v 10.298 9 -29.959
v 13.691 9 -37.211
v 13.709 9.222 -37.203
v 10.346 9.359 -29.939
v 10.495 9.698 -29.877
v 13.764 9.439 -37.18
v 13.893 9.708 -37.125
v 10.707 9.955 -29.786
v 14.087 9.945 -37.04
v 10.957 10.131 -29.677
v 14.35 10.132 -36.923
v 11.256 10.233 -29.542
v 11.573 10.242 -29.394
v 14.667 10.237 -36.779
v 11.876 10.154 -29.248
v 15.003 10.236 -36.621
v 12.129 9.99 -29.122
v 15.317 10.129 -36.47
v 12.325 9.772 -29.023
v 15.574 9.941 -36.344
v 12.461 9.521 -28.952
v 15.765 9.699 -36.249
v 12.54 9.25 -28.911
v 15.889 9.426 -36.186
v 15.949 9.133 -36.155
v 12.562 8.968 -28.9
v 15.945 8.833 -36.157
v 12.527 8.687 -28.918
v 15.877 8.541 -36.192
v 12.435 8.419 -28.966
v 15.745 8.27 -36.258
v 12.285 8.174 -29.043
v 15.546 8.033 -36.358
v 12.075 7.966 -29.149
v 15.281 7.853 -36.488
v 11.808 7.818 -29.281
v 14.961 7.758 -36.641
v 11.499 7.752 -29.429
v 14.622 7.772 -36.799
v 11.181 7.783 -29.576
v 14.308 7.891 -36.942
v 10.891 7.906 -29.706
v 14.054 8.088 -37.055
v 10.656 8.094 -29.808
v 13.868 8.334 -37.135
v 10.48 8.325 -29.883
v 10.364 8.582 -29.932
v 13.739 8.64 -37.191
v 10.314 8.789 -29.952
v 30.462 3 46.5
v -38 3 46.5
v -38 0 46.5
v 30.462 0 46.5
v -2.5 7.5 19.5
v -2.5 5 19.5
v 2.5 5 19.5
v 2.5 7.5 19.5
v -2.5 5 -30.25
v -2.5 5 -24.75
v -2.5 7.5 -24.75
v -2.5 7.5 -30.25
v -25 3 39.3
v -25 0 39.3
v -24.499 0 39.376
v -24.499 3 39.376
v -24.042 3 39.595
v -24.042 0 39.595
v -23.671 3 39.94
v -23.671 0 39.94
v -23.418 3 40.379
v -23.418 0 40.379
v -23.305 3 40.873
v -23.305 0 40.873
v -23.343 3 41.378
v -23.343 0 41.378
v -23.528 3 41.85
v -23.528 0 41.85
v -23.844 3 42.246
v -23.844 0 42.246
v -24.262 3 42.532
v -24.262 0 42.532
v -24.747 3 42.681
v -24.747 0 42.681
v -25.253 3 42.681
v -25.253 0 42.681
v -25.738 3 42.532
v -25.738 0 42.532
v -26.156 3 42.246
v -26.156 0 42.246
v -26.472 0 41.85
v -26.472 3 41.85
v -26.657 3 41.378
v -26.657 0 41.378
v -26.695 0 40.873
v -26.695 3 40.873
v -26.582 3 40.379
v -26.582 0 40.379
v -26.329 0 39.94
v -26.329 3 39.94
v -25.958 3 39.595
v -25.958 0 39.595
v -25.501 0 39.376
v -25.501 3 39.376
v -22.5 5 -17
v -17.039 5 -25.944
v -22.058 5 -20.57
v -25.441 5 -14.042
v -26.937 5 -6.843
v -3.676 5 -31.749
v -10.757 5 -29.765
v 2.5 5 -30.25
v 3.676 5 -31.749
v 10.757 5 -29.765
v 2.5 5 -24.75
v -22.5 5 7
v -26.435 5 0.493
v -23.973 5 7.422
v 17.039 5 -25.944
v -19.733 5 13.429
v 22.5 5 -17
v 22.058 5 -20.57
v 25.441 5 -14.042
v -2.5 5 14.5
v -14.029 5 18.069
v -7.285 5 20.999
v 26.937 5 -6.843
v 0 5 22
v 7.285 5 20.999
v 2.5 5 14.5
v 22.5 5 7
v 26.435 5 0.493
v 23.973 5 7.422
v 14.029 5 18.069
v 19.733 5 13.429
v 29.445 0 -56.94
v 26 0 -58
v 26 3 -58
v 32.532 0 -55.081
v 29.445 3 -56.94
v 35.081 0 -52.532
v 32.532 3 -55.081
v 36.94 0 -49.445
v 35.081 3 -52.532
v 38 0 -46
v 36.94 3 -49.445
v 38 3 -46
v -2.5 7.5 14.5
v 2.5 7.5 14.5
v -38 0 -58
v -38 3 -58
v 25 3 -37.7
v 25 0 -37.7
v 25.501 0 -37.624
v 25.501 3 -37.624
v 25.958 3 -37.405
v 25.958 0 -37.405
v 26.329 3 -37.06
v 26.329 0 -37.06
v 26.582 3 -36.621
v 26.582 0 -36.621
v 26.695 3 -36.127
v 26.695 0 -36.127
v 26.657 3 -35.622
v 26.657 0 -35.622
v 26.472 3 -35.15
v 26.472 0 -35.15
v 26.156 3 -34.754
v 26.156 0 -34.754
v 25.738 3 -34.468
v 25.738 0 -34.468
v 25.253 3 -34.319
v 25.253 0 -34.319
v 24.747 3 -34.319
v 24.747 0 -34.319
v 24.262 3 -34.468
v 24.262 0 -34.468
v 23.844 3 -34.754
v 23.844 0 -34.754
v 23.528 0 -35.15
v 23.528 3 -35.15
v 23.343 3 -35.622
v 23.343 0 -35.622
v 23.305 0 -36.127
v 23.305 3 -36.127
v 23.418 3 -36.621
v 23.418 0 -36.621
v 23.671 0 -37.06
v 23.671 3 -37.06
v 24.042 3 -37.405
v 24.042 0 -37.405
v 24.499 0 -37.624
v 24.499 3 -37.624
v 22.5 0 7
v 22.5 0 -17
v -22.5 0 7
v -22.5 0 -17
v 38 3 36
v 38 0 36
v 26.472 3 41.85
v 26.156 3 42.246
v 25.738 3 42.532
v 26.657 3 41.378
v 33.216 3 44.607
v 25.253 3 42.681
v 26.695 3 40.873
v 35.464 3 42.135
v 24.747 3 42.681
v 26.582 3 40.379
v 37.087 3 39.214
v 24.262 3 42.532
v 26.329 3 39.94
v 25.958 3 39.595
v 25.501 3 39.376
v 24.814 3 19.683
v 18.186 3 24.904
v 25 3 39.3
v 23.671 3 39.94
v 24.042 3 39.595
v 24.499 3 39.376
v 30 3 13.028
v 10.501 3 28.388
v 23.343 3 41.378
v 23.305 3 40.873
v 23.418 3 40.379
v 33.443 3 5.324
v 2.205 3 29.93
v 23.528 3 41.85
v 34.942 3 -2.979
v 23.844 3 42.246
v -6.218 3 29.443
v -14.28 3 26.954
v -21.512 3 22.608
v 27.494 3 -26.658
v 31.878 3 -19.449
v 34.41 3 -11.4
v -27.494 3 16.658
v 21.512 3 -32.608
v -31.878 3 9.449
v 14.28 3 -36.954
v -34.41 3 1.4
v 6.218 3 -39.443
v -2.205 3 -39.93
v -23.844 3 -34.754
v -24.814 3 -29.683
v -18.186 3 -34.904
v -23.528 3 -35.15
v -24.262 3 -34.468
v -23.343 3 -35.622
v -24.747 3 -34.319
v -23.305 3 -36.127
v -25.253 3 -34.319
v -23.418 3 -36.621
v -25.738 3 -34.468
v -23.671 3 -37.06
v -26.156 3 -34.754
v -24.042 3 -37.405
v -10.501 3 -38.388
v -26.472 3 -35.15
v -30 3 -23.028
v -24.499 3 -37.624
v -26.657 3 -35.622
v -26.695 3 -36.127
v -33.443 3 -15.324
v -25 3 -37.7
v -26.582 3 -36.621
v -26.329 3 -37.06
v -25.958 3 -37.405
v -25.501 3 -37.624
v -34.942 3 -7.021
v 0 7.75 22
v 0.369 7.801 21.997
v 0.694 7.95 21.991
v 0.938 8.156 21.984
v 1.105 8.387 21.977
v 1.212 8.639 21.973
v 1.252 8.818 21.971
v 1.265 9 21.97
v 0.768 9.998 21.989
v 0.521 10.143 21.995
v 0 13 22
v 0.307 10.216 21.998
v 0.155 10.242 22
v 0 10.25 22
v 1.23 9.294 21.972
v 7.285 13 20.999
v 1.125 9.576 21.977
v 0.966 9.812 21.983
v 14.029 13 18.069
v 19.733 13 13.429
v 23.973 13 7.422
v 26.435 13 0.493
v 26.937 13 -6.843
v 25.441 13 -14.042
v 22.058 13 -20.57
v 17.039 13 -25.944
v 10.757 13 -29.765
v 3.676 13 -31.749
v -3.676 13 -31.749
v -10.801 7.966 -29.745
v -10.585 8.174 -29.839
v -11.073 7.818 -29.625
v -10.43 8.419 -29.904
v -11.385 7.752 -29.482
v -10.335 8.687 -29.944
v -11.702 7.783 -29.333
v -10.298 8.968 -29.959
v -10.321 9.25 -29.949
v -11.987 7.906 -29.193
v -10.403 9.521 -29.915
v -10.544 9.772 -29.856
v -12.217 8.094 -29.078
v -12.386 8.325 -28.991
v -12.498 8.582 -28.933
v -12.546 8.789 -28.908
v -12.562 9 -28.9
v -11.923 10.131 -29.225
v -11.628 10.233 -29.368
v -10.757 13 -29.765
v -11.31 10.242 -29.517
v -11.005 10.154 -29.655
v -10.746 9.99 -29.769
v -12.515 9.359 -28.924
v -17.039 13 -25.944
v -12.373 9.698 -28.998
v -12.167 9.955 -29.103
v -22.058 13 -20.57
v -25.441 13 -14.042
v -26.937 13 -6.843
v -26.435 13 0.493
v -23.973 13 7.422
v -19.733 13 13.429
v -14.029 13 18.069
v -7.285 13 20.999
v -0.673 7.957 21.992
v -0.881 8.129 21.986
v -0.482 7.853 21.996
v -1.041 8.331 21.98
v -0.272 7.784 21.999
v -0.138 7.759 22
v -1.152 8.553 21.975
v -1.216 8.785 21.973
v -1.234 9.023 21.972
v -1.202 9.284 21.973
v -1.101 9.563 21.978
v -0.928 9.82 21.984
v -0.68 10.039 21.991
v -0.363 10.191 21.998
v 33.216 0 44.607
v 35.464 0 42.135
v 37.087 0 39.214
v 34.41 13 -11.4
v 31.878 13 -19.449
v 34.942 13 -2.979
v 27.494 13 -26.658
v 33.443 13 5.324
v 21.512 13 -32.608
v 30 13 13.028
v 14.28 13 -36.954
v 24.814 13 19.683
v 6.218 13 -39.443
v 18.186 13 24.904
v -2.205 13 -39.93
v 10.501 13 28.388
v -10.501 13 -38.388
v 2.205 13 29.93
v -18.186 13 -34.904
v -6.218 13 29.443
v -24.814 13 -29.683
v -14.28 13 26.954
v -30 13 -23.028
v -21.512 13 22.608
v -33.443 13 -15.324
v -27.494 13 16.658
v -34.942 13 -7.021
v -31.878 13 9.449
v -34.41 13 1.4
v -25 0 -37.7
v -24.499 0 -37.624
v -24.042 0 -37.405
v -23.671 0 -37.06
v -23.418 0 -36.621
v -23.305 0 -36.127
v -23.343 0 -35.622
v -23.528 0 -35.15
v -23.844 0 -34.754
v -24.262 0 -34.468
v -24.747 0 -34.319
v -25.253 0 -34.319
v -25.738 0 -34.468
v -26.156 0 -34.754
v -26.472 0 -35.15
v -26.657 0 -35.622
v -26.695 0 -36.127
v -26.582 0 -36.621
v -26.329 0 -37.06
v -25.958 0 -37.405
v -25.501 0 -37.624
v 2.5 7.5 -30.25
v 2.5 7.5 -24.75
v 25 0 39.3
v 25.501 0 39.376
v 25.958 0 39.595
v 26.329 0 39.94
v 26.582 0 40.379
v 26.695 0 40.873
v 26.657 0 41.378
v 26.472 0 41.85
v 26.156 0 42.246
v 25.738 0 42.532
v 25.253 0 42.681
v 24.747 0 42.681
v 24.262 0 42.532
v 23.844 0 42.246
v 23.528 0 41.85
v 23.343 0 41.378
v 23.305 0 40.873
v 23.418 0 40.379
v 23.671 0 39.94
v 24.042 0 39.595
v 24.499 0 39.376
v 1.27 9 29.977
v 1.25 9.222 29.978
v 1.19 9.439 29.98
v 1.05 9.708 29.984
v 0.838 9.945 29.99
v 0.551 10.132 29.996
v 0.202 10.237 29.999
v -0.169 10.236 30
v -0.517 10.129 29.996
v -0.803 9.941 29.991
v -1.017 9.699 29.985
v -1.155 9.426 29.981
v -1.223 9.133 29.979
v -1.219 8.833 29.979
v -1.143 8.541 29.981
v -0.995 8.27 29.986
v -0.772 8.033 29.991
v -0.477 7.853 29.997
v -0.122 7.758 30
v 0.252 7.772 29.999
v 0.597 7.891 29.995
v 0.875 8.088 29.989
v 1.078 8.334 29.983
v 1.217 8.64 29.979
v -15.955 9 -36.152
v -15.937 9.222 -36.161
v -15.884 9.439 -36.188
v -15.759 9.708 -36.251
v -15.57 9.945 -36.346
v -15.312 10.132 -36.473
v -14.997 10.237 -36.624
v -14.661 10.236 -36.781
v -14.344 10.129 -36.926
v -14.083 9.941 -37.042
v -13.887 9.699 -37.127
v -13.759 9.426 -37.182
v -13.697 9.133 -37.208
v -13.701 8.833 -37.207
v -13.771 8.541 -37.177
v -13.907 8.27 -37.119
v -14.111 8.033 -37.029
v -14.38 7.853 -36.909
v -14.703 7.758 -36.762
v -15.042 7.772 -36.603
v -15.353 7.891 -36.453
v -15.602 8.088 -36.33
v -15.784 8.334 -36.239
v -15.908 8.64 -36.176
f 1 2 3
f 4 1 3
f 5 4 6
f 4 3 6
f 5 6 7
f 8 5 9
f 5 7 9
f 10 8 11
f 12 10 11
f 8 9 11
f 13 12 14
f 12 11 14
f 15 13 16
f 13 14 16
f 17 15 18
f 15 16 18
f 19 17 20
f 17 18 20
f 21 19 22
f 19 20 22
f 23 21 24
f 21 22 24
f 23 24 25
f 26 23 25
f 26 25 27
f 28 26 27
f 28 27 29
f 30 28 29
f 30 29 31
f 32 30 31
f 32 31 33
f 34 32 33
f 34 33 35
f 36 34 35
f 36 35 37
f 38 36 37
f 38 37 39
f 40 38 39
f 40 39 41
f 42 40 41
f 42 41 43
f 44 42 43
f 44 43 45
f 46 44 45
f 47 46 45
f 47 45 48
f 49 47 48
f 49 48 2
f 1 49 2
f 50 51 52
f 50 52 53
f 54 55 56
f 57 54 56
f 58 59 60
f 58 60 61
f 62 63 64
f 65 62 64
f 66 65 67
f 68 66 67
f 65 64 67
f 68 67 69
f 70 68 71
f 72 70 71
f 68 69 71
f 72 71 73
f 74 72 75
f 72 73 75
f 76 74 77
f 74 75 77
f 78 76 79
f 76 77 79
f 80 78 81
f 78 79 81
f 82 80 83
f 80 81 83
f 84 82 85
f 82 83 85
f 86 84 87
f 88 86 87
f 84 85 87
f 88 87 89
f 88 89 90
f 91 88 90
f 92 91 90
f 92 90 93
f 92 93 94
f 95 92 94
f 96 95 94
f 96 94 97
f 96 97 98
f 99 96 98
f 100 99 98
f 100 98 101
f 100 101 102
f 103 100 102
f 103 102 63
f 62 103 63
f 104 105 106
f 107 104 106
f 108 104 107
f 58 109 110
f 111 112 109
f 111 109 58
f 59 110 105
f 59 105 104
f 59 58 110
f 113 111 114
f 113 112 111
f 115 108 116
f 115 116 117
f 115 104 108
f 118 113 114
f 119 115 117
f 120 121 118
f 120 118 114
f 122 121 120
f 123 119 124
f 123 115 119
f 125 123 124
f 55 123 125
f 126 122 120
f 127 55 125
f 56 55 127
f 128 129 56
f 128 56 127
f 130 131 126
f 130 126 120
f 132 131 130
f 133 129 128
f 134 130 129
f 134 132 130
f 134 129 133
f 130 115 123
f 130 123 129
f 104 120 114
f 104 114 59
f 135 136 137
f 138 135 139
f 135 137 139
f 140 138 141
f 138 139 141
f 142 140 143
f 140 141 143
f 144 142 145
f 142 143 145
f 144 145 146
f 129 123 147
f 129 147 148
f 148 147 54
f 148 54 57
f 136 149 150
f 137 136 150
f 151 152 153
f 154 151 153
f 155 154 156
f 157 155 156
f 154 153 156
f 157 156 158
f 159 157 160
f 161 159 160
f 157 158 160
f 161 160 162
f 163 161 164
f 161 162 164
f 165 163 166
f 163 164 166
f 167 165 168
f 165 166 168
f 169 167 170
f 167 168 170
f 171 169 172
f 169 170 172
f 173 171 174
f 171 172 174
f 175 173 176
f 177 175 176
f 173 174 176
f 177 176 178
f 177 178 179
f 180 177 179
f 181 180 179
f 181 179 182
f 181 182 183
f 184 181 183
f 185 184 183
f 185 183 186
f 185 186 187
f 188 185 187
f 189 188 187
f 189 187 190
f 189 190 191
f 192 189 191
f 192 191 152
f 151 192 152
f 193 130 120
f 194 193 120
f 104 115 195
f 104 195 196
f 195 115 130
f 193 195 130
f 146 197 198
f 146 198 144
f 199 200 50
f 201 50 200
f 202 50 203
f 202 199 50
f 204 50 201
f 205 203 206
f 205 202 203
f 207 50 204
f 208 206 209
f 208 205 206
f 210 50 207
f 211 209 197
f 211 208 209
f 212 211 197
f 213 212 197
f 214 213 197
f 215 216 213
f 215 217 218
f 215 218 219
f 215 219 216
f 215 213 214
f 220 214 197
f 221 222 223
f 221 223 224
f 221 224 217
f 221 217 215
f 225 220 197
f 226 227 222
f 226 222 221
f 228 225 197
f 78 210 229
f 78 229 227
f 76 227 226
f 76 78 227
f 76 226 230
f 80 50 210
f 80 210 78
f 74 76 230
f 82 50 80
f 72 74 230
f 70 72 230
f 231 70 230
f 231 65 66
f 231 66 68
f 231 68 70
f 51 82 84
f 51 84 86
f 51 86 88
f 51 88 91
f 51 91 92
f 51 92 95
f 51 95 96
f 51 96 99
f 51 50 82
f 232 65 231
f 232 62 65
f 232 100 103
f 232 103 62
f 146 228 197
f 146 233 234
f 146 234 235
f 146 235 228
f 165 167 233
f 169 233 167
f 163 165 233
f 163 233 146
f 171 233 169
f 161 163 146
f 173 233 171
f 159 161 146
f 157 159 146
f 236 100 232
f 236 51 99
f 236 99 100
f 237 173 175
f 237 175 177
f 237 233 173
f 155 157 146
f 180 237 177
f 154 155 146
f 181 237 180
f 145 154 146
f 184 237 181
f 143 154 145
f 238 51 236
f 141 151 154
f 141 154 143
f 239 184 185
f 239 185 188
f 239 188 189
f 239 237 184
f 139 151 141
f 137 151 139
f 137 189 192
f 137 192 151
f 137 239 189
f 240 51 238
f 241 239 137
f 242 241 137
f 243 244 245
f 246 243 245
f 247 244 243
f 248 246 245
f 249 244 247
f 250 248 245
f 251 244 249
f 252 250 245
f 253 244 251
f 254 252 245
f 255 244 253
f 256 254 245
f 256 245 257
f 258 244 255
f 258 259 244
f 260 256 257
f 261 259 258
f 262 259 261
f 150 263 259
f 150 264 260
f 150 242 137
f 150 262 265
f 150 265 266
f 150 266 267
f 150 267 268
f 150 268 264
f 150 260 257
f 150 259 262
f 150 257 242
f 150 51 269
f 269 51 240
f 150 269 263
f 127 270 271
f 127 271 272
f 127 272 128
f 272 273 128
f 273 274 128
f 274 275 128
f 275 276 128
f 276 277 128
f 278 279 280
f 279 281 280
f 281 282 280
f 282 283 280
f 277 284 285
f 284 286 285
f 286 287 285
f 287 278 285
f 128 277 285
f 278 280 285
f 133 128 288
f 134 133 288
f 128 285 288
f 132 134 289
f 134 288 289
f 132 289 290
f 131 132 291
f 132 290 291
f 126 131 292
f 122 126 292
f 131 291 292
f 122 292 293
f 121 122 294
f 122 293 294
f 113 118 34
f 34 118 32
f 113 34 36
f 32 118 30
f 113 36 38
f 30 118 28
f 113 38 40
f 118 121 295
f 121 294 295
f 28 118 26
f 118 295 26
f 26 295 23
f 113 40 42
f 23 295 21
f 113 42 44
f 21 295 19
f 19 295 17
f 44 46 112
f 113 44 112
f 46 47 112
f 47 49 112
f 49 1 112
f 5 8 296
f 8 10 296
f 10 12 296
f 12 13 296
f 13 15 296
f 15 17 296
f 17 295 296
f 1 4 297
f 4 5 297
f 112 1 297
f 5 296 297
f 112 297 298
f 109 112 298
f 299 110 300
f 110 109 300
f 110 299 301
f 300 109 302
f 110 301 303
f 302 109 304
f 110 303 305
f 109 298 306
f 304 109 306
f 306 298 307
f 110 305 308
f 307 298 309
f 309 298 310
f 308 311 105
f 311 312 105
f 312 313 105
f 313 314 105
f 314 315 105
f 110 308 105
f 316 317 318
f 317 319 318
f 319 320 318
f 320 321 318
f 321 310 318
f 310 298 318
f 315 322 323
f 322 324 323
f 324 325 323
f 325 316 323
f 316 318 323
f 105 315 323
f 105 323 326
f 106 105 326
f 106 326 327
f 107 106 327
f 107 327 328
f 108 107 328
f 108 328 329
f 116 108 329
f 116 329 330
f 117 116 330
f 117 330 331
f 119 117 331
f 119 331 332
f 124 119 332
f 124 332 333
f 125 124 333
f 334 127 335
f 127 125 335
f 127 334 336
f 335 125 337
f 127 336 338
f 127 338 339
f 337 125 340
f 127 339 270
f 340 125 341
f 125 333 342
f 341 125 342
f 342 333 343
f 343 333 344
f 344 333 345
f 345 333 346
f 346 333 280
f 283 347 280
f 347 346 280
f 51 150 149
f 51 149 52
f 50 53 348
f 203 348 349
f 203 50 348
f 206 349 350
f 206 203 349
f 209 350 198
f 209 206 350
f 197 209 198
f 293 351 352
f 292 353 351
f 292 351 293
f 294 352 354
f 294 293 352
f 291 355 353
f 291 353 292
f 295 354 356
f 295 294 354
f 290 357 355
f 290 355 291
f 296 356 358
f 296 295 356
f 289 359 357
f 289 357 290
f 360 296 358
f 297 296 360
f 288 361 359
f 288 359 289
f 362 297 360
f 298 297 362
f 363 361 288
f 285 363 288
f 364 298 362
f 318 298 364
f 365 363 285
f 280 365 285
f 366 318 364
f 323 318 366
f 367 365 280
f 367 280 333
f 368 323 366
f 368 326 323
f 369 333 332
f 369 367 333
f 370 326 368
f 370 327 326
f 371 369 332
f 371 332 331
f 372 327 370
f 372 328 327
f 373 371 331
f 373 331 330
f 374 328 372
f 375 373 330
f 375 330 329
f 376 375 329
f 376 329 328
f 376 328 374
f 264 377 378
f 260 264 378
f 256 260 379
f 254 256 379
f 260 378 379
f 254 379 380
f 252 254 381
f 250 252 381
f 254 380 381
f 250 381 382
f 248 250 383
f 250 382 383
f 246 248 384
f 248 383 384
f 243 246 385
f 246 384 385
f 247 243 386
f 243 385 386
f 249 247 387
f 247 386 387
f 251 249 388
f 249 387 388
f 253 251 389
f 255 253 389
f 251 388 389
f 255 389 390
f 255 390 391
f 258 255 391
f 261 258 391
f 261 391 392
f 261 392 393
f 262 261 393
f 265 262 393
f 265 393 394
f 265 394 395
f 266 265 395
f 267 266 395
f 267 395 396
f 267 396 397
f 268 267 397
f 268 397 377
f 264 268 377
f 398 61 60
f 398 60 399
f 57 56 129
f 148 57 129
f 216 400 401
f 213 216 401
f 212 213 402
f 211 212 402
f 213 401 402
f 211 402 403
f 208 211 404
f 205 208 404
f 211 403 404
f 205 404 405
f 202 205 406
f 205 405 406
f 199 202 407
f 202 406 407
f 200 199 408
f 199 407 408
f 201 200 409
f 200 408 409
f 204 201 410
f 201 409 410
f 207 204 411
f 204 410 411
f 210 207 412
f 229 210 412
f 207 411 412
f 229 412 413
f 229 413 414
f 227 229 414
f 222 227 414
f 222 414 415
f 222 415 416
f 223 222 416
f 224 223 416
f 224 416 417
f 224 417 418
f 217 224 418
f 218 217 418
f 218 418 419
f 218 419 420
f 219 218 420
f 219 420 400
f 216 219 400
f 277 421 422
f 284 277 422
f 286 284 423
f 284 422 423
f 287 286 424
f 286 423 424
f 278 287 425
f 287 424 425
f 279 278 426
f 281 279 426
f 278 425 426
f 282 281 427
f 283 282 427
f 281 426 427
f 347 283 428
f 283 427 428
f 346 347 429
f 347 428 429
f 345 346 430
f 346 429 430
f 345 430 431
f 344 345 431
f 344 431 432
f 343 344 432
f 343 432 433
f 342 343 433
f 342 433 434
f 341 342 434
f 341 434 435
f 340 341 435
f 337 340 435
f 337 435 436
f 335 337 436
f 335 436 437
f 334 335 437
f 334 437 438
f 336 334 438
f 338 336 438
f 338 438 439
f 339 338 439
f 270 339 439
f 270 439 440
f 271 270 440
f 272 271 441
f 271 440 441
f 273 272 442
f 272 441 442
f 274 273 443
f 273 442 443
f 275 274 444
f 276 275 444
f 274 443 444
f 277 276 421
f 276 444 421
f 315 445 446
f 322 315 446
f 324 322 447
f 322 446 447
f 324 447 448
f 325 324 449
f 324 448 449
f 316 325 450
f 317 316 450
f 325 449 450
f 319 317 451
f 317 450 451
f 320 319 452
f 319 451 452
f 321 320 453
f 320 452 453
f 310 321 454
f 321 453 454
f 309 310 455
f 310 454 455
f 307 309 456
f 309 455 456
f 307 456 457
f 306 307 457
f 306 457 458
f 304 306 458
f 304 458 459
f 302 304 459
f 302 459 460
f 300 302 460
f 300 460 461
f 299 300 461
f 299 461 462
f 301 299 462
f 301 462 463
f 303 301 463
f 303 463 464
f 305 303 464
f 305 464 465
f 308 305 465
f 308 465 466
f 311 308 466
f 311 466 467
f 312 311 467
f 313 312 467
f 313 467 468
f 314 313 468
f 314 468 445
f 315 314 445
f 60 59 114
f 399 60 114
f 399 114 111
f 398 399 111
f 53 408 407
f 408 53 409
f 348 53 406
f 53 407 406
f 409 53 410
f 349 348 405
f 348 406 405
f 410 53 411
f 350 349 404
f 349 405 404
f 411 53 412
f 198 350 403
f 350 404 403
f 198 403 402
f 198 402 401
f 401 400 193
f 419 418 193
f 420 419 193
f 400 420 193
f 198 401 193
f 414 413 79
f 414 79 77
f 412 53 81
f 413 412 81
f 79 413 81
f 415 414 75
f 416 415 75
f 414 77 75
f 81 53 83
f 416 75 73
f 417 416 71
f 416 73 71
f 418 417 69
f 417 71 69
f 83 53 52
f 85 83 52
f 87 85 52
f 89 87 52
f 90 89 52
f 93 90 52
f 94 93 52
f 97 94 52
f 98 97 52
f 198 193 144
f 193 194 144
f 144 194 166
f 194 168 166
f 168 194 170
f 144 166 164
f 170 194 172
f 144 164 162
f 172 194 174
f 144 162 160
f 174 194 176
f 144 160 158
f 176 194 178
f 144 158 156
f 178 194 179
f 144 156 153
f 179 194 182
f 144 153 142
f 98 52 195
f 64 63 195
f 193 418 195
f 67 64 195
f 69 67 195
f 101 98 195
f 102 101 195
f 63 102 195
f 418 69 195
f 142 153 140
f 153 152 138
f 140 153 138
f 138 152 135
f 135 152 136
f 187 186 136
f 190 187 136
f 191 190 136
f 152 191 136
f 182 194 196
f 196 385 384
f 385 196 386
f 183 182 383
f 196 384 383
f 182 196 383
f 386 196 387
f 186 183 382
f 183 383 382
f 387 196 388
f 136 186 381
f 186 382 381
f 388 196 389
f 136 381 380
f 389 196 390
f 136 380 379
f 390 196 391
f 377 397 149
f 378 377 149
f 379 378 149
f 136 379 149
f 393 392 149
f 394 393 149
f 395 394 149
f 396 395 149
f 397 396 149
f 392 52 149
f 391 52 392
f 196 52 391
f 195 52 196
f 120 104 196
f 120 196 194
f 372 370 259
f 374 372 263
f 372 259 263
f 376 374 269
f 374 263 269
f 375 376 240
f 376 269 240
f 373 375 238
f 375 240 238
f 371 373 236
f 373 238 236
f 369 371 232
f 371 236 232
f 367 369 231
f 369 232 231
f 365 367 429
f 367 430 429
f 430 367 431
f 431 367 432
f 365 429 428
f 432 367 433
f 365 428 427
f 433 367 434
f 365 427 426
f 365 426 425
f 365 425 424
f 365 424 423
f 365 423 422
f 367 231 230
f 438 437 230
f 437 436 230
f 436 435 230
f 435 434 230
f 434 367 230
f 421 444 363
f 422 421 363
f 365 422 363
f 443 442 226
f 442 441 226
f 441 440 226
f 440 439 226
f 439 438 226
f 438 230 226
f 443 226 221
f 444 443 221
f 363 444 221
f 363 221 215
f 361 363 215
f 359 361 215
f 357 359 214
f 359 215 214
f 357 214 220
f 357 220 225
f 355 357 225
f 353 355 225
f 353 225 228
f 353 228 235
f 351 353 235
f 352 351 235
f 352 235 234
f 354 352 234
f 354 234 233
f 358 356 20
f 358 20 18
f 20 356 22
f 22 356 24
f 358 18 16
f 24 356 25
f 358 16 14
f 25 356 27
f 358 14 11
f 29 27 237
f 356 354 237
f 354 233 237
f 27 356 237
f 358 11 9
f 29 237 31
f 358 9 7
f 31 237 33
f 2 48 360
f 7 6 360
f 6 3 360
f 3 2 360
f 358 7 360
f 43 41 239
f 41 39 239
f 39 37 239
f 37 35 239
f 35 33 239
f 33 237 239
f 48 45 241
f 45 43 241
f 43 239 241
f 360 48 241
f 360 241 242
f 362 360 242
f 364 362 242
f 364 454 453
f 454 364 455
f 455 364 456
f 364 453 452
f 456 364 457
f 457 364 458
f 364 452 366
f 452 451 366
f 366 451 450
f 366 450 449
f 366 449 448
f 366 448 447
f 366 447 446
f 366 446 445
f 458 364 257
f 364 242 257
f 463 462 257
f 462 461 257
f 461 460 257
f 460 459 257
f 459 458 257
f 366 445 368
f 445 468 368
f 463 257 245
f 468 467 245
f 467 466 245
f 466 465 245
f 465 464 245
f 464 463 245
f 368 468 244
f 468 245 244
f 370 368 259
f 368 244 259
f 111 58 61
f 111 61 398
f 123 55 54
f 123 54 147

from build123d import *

# Parameters (mm, degrees)
SKETCH1_W                  = 60
SKETCH1_H                  = 102
BOSS_EXTRUDE1_DEPTH        = 3
M3_CLEARANCE_HOLE1_D       = 3.4
SKETCH5_R                  = 35
BOSS_EXTRUDE2_DEPTH        = 10
SKETCH6_R                  = 27
CUT_EXTRUDE1_DEPTH         = 8
SKETCH8_W                  = 5
SKETCH8_H                  = 5.5
BOSS_EXTRUDE3_DEPTH        = 2.5
SKETCH9_W                  = 5
SKETCH9_H                  = 5
BOSS_EXTRUDE4_DEPTH        = 2.5
SKETCH10_W                 = 45
SKETCH10_H                 = 24
CUT_EXTRUDE2_DEPTH         = 63.369864518
SKETCH12_W                 = 60
SKETCH12_H                 = 2
CUT_EXTRUDE3_DEPTH         = 63.657800791
SKETCH13_W                 = 60
SKETCH13_H                 = 3
CUT_EXTRUDE4_DEPTH         = 63.657800791
SKETCH14_W                 = 60
SKETCH14_H                 = 3
BOSS_EXTRUDE5_DEPTH        = 9
SKETCH16_W                 = 106
SKETCH16_H                 = 3
BOSS_EXTRUDE6_DEPTH        = 8
SKETCH17_W                 = 106
SKETCH17_H                 = 3
BOSS_EXTRUDE7_DEPTH        = 8
CUT_EXTRUDE5_DEPTH         = 15
CUT_EXTRUDE6_DEPTH         = 71.057119553
M3X0_5_TAPPED_HOLE1_REACH  = 102.233
M3X0_5_TAPPED_HOLE1_BORE_R = 1.25
M3X0_5_TAPPED_HOLE2_REACH  = 102.233
M3X0_5_TAPPED_HOLE2_BORE_R = 1.25
M3X0_5_TAPPED_HOLE3_REACH  = 98.284
M3X0_5_TAPPED_HOLE3_BORE_R = 1.25
SKETCH28_W                 = 76
SKETCH28_H                 = 1.5
CUT_EXTRUDE7_DEPTH         = 71.057119567


with BuildPart() as part:
    # Sketch1 → Boss-Extrude1 (new body)
    with BuildSketch(Plane(origin=(0, 0, 0), x_dir=(1, 0, 0), z_dir=(0, 1, 0))):
        Rectangle(SKETCH1_W, SKETCH1_H)
    extrude(amount=BOSS_EXTRUDE1_DEPTH)

    # M3 Clearance Hole1 (through all)
    with Locations(Plane(origin=(-25, 3, -36), x_dir=(0, 0, 1), z_dir=(0, 1, 0))):
        with Locations((0, 0), (0, 50), (77, 0), (77, 50)):
            Hole(M3_CLEARANCE_HOLE1_D / 2)

    # Sketch5 → Boss-Extrude2 (add)
    with BuildSketch(Plane(origin=(0, 3, 0), x_dir=(1, 0, 0), z_dir=(0, 1, 0))):
        with Locations(Location((0, 5, 0), (0, 0, 148.997280866))):
            Circle(SKETCH5_R)
    extrude(amount=BOSS_EXTRUDE2_DEPTH)

    # Sketch6 → Cut-Extrude1 (cut)
    with BuildSketch(Plane(origin=(0, 13, 0), x_dir=(1, 0, 0), z_dir=(0, 1, 0))):
        with Locations(Location((0, 5, 0), (0, 0, 270))):
            Circle(SKETCH6_R)
    extrude(amount=-CUT_EXTRUDE1_DEPTH, mode=Mode.SUBTRACT)

    # Sketch8 → Boss-Extrude3 (add)
    with BuildSketch(Plane(origin=(0, 5, 0), x_dir=(1, 0, 0), z_dir=(0, 1, 0))):
        with Locations((0, 27.5)):
            Rectangle(SKETCH8_W, SKETCH8_H)
    extrude(amount=BOSS_EXTRUDE3_DEPTH)

    # Sketch9 → Boss-Extrude4 (add)
    with BuildSketch(Plane(origin=(0, 5, 0), x_dir=(1, 0, 0), z_dir=(0, 1, 0))):
        with Locations((0, -17)):
            Rectangle(SKETCH9_W, SKETCH9_H)
    extrude(amount=BOSS_EXTRUDE4_DEPTH)

    # Sketch10 → Cut-Extrude2 (cut, through all)
    with BuildSketch(Plane(origin=(0, 5, 0), x_dir=(1, 0, 0), z_dir=(0, 1, 0))):
        with Locations((0, 5)):
            Rectangle(SKETCH10_W, SKETCH10_H)
    extrude(amount=-CUT_EXTRUDE2_DEPTH, mode=Mode.SUBTRACT)

    # Sketch12 → Cut-Extrude3 (cut, through all)
    with BuildSketch(Plane(origin=(0, 3, 0), x_dir=(1, 0, 0), z_dir=(0, 1, 0))):
        with Locations((0, 50)):
            Rectangle(SKETCH12_W, SKETCH12_H)
    extrude(amount=-CUT_EXTRUDE3_DEPTH, mode=Mode.SUBTRACT)

    # Sketch13 → Cut-Extrude4 (cut, through all)
    with BuildSketch(Plane(origin=(0, 3, 0), x_dir=(1, 0, 0), z_dir=(0, 1, 0))):
        with Locations((0, -49.5)):
            Rectangle(SKETCH13_W, SKETCH13_H)
    extrude(amount=-CUT_EXTRUDE4_DEPTH, mode=Mode.SUBTRACT)

    # Sketch14 → Boss-Extrude5 (add)
    with BuildSketch(Plane(origin=(0, 0, -49), x_dir=(-1, 0, 0), z_dir=(0, 0, -1))):
        with Locations((0, 1.5)):
            Rectangle(SKETCH14_W, SKETCH14_H)
    extrude(amount=BOSS_EXTRUDE5_DEPTH)

    # Sketch16 → Boss-Extrude6 (add)
    with BuildSketch(Plane.ZY.offset(30)):
        with Locations((-5, 1.5)):
            Rectangle(SKETCH16_W, SKETCH16_H)
    extrude(amount=BOSS_EXTRUDE6_DEPTH)

    # Sketch17 → Boss-Extrude7 (add)
    with BuildSketch(Plane(origin=(30, 0, 0), x_dir=(0, 0, -1), z_dir=(1, 0, 0))):
        with Locations((5, 1.5)):
            Rectangle(SKETCH17_W, SKETCH17_H)
    extrude(amount=BOSS_EXTRUDE7_DEPTH)

    # Sketch18 → Cut-Extrude5 (cut)
    with BuildSketch(Plane(origin=(0, 3, 0), x_dir=(1, 0, 0), z_dir=(0, 1, 0))):
        with BuildLine():
            Line((38, 46), (38, 58))
            Line((38, 58), (26, 58))
            ThreePointArc((26, 58), (33.884200012, 53.884200012), (38, 46))
        make_face()
    extrude(amount=-CUT_EXTRUDE5_DEPTH, mode=Mode.SUBTRACT)

    # Sketch19 → Cut-Extrude6 (cut, through all)
    with BuildSketch(Plane(origin=(0, 3, 0), x_dir=(1, 0, 0), z_dir=(0, 1, 0))):
        with BuildLine():
            Line((38, -36), (38, -48))
            Line((38, -48), (26, -48))
            ThreePointArc((26, -48), (33.934883201, -43.934883201), (38, -36))
        make_face()
    extrude(amount=-CUT_EXTRUDE6_DEPTH, mode=Mode.SUBTRACT)

    # M3x0.5 Tapped Hole1 bore (on position points) → M3x0.5 Tapped Hole1 (cut, up to next)
    with BuildSketch(Plane(origin=(-14.832396974, 9, -36.701734968), x_dir=(-0.905763856237, 0, 0.423782770691), z_dir=(-0.423782770691, 0, -0.905763856237)), mode=Mode.PRIVATE) as m3x0_5_tapped_hole1_sk1:
        Circle(M3X0_5_TAPPED_HOLE1_BORE_R)
    m3x0_5_tapped_hole1_tool1 = extrude(m3x0_5_tapped_hole1_sk1.sketch, amount=-M3X0_5_TAPPED_HOLE1_REACH, mode=Mode.PRIVATE) & part.part
    add(m3x0_5_tapped_hole1_tool1.solids().sort_by_distance((-14.832397, 9, -36.701735))[0], mode=Mode.SUBTRACT)

    # M3x0.5 Tapped Hole2 bore (on position points) → M3x0.5 Tapped Hole2 (cut, up to next)
    with BuildSketch(Plane(origin=(14.832396974, 9, -36.701734968), x_dir=(-0.905763856237, 0, -0.423782770691), z_dir=(0.423782770691, 0, -0.905763856237)), mode=Mode.PRIVATE) as m3x0_5_tapped_hole2_sk1:
        Circle(M3X0_5_TAPPED_HOLE2_BORE_R)
    m3x0_5_tapped_hole2_tool1 = extrude(m3x0_5_tapped_hole2_sk1.sketch, amount=-M3X0_5_TAPPED_HOLE2_REACH, mode=Mode.PRIVATE) & part.part
    add(m3x0_5_tapped_hole2_tool1.solids().sort_by_distance((14.832397, 9, -36.701735))[0], mode=Mode.SUBTRACT)

    # M3x0.5 Tapped Hole3 bore (on position points) → M3x0.5 Tapped Hole3 (cut, up to next)
    with BuildSketch(Plane(origin=(0.02, 9, 29.999994286), x_dir=(0.999999836735, 0, -0.000571428571), z_dir=(0.000571428571, 0, 0.999999836735)), mode=Mode.PRIVATE) as m3x0_5_tapped_hole3_sk1:
        Circle(M3X0_5_TAPPED_HOLE3_BORE_R)
    m3x0_5_tapped_hole3_tool1 = extrude(m3x0_5_tapped_hole3_sk1.sketch, amount=-M3X0_5_TAPPED_HOLE3_REACH, mode=Mode.PRIVATE) & part.part
    add(m3x0_5_tapped_hole3_tool1.solids().sort_by_distance((0.02, 9, 29.999994))[0], mode=Mode.SUBTRACT)

    # Sketch28 → Cut-Extrude7 (cut, through all)
    with BuildSketch(Plane(origin=(0, 3, 0), x_dir=(1, 0, 0), z_dir=(0, 1, 0))):
        with Locations((0, -47.25)):
            Rectangle(SKETCH28_W, SKETCH28_H)
    extrude(amount=-CUT_EXTRUDE7_DEPTH, mode=Mode.SUBTRACT)


solid = part.part
